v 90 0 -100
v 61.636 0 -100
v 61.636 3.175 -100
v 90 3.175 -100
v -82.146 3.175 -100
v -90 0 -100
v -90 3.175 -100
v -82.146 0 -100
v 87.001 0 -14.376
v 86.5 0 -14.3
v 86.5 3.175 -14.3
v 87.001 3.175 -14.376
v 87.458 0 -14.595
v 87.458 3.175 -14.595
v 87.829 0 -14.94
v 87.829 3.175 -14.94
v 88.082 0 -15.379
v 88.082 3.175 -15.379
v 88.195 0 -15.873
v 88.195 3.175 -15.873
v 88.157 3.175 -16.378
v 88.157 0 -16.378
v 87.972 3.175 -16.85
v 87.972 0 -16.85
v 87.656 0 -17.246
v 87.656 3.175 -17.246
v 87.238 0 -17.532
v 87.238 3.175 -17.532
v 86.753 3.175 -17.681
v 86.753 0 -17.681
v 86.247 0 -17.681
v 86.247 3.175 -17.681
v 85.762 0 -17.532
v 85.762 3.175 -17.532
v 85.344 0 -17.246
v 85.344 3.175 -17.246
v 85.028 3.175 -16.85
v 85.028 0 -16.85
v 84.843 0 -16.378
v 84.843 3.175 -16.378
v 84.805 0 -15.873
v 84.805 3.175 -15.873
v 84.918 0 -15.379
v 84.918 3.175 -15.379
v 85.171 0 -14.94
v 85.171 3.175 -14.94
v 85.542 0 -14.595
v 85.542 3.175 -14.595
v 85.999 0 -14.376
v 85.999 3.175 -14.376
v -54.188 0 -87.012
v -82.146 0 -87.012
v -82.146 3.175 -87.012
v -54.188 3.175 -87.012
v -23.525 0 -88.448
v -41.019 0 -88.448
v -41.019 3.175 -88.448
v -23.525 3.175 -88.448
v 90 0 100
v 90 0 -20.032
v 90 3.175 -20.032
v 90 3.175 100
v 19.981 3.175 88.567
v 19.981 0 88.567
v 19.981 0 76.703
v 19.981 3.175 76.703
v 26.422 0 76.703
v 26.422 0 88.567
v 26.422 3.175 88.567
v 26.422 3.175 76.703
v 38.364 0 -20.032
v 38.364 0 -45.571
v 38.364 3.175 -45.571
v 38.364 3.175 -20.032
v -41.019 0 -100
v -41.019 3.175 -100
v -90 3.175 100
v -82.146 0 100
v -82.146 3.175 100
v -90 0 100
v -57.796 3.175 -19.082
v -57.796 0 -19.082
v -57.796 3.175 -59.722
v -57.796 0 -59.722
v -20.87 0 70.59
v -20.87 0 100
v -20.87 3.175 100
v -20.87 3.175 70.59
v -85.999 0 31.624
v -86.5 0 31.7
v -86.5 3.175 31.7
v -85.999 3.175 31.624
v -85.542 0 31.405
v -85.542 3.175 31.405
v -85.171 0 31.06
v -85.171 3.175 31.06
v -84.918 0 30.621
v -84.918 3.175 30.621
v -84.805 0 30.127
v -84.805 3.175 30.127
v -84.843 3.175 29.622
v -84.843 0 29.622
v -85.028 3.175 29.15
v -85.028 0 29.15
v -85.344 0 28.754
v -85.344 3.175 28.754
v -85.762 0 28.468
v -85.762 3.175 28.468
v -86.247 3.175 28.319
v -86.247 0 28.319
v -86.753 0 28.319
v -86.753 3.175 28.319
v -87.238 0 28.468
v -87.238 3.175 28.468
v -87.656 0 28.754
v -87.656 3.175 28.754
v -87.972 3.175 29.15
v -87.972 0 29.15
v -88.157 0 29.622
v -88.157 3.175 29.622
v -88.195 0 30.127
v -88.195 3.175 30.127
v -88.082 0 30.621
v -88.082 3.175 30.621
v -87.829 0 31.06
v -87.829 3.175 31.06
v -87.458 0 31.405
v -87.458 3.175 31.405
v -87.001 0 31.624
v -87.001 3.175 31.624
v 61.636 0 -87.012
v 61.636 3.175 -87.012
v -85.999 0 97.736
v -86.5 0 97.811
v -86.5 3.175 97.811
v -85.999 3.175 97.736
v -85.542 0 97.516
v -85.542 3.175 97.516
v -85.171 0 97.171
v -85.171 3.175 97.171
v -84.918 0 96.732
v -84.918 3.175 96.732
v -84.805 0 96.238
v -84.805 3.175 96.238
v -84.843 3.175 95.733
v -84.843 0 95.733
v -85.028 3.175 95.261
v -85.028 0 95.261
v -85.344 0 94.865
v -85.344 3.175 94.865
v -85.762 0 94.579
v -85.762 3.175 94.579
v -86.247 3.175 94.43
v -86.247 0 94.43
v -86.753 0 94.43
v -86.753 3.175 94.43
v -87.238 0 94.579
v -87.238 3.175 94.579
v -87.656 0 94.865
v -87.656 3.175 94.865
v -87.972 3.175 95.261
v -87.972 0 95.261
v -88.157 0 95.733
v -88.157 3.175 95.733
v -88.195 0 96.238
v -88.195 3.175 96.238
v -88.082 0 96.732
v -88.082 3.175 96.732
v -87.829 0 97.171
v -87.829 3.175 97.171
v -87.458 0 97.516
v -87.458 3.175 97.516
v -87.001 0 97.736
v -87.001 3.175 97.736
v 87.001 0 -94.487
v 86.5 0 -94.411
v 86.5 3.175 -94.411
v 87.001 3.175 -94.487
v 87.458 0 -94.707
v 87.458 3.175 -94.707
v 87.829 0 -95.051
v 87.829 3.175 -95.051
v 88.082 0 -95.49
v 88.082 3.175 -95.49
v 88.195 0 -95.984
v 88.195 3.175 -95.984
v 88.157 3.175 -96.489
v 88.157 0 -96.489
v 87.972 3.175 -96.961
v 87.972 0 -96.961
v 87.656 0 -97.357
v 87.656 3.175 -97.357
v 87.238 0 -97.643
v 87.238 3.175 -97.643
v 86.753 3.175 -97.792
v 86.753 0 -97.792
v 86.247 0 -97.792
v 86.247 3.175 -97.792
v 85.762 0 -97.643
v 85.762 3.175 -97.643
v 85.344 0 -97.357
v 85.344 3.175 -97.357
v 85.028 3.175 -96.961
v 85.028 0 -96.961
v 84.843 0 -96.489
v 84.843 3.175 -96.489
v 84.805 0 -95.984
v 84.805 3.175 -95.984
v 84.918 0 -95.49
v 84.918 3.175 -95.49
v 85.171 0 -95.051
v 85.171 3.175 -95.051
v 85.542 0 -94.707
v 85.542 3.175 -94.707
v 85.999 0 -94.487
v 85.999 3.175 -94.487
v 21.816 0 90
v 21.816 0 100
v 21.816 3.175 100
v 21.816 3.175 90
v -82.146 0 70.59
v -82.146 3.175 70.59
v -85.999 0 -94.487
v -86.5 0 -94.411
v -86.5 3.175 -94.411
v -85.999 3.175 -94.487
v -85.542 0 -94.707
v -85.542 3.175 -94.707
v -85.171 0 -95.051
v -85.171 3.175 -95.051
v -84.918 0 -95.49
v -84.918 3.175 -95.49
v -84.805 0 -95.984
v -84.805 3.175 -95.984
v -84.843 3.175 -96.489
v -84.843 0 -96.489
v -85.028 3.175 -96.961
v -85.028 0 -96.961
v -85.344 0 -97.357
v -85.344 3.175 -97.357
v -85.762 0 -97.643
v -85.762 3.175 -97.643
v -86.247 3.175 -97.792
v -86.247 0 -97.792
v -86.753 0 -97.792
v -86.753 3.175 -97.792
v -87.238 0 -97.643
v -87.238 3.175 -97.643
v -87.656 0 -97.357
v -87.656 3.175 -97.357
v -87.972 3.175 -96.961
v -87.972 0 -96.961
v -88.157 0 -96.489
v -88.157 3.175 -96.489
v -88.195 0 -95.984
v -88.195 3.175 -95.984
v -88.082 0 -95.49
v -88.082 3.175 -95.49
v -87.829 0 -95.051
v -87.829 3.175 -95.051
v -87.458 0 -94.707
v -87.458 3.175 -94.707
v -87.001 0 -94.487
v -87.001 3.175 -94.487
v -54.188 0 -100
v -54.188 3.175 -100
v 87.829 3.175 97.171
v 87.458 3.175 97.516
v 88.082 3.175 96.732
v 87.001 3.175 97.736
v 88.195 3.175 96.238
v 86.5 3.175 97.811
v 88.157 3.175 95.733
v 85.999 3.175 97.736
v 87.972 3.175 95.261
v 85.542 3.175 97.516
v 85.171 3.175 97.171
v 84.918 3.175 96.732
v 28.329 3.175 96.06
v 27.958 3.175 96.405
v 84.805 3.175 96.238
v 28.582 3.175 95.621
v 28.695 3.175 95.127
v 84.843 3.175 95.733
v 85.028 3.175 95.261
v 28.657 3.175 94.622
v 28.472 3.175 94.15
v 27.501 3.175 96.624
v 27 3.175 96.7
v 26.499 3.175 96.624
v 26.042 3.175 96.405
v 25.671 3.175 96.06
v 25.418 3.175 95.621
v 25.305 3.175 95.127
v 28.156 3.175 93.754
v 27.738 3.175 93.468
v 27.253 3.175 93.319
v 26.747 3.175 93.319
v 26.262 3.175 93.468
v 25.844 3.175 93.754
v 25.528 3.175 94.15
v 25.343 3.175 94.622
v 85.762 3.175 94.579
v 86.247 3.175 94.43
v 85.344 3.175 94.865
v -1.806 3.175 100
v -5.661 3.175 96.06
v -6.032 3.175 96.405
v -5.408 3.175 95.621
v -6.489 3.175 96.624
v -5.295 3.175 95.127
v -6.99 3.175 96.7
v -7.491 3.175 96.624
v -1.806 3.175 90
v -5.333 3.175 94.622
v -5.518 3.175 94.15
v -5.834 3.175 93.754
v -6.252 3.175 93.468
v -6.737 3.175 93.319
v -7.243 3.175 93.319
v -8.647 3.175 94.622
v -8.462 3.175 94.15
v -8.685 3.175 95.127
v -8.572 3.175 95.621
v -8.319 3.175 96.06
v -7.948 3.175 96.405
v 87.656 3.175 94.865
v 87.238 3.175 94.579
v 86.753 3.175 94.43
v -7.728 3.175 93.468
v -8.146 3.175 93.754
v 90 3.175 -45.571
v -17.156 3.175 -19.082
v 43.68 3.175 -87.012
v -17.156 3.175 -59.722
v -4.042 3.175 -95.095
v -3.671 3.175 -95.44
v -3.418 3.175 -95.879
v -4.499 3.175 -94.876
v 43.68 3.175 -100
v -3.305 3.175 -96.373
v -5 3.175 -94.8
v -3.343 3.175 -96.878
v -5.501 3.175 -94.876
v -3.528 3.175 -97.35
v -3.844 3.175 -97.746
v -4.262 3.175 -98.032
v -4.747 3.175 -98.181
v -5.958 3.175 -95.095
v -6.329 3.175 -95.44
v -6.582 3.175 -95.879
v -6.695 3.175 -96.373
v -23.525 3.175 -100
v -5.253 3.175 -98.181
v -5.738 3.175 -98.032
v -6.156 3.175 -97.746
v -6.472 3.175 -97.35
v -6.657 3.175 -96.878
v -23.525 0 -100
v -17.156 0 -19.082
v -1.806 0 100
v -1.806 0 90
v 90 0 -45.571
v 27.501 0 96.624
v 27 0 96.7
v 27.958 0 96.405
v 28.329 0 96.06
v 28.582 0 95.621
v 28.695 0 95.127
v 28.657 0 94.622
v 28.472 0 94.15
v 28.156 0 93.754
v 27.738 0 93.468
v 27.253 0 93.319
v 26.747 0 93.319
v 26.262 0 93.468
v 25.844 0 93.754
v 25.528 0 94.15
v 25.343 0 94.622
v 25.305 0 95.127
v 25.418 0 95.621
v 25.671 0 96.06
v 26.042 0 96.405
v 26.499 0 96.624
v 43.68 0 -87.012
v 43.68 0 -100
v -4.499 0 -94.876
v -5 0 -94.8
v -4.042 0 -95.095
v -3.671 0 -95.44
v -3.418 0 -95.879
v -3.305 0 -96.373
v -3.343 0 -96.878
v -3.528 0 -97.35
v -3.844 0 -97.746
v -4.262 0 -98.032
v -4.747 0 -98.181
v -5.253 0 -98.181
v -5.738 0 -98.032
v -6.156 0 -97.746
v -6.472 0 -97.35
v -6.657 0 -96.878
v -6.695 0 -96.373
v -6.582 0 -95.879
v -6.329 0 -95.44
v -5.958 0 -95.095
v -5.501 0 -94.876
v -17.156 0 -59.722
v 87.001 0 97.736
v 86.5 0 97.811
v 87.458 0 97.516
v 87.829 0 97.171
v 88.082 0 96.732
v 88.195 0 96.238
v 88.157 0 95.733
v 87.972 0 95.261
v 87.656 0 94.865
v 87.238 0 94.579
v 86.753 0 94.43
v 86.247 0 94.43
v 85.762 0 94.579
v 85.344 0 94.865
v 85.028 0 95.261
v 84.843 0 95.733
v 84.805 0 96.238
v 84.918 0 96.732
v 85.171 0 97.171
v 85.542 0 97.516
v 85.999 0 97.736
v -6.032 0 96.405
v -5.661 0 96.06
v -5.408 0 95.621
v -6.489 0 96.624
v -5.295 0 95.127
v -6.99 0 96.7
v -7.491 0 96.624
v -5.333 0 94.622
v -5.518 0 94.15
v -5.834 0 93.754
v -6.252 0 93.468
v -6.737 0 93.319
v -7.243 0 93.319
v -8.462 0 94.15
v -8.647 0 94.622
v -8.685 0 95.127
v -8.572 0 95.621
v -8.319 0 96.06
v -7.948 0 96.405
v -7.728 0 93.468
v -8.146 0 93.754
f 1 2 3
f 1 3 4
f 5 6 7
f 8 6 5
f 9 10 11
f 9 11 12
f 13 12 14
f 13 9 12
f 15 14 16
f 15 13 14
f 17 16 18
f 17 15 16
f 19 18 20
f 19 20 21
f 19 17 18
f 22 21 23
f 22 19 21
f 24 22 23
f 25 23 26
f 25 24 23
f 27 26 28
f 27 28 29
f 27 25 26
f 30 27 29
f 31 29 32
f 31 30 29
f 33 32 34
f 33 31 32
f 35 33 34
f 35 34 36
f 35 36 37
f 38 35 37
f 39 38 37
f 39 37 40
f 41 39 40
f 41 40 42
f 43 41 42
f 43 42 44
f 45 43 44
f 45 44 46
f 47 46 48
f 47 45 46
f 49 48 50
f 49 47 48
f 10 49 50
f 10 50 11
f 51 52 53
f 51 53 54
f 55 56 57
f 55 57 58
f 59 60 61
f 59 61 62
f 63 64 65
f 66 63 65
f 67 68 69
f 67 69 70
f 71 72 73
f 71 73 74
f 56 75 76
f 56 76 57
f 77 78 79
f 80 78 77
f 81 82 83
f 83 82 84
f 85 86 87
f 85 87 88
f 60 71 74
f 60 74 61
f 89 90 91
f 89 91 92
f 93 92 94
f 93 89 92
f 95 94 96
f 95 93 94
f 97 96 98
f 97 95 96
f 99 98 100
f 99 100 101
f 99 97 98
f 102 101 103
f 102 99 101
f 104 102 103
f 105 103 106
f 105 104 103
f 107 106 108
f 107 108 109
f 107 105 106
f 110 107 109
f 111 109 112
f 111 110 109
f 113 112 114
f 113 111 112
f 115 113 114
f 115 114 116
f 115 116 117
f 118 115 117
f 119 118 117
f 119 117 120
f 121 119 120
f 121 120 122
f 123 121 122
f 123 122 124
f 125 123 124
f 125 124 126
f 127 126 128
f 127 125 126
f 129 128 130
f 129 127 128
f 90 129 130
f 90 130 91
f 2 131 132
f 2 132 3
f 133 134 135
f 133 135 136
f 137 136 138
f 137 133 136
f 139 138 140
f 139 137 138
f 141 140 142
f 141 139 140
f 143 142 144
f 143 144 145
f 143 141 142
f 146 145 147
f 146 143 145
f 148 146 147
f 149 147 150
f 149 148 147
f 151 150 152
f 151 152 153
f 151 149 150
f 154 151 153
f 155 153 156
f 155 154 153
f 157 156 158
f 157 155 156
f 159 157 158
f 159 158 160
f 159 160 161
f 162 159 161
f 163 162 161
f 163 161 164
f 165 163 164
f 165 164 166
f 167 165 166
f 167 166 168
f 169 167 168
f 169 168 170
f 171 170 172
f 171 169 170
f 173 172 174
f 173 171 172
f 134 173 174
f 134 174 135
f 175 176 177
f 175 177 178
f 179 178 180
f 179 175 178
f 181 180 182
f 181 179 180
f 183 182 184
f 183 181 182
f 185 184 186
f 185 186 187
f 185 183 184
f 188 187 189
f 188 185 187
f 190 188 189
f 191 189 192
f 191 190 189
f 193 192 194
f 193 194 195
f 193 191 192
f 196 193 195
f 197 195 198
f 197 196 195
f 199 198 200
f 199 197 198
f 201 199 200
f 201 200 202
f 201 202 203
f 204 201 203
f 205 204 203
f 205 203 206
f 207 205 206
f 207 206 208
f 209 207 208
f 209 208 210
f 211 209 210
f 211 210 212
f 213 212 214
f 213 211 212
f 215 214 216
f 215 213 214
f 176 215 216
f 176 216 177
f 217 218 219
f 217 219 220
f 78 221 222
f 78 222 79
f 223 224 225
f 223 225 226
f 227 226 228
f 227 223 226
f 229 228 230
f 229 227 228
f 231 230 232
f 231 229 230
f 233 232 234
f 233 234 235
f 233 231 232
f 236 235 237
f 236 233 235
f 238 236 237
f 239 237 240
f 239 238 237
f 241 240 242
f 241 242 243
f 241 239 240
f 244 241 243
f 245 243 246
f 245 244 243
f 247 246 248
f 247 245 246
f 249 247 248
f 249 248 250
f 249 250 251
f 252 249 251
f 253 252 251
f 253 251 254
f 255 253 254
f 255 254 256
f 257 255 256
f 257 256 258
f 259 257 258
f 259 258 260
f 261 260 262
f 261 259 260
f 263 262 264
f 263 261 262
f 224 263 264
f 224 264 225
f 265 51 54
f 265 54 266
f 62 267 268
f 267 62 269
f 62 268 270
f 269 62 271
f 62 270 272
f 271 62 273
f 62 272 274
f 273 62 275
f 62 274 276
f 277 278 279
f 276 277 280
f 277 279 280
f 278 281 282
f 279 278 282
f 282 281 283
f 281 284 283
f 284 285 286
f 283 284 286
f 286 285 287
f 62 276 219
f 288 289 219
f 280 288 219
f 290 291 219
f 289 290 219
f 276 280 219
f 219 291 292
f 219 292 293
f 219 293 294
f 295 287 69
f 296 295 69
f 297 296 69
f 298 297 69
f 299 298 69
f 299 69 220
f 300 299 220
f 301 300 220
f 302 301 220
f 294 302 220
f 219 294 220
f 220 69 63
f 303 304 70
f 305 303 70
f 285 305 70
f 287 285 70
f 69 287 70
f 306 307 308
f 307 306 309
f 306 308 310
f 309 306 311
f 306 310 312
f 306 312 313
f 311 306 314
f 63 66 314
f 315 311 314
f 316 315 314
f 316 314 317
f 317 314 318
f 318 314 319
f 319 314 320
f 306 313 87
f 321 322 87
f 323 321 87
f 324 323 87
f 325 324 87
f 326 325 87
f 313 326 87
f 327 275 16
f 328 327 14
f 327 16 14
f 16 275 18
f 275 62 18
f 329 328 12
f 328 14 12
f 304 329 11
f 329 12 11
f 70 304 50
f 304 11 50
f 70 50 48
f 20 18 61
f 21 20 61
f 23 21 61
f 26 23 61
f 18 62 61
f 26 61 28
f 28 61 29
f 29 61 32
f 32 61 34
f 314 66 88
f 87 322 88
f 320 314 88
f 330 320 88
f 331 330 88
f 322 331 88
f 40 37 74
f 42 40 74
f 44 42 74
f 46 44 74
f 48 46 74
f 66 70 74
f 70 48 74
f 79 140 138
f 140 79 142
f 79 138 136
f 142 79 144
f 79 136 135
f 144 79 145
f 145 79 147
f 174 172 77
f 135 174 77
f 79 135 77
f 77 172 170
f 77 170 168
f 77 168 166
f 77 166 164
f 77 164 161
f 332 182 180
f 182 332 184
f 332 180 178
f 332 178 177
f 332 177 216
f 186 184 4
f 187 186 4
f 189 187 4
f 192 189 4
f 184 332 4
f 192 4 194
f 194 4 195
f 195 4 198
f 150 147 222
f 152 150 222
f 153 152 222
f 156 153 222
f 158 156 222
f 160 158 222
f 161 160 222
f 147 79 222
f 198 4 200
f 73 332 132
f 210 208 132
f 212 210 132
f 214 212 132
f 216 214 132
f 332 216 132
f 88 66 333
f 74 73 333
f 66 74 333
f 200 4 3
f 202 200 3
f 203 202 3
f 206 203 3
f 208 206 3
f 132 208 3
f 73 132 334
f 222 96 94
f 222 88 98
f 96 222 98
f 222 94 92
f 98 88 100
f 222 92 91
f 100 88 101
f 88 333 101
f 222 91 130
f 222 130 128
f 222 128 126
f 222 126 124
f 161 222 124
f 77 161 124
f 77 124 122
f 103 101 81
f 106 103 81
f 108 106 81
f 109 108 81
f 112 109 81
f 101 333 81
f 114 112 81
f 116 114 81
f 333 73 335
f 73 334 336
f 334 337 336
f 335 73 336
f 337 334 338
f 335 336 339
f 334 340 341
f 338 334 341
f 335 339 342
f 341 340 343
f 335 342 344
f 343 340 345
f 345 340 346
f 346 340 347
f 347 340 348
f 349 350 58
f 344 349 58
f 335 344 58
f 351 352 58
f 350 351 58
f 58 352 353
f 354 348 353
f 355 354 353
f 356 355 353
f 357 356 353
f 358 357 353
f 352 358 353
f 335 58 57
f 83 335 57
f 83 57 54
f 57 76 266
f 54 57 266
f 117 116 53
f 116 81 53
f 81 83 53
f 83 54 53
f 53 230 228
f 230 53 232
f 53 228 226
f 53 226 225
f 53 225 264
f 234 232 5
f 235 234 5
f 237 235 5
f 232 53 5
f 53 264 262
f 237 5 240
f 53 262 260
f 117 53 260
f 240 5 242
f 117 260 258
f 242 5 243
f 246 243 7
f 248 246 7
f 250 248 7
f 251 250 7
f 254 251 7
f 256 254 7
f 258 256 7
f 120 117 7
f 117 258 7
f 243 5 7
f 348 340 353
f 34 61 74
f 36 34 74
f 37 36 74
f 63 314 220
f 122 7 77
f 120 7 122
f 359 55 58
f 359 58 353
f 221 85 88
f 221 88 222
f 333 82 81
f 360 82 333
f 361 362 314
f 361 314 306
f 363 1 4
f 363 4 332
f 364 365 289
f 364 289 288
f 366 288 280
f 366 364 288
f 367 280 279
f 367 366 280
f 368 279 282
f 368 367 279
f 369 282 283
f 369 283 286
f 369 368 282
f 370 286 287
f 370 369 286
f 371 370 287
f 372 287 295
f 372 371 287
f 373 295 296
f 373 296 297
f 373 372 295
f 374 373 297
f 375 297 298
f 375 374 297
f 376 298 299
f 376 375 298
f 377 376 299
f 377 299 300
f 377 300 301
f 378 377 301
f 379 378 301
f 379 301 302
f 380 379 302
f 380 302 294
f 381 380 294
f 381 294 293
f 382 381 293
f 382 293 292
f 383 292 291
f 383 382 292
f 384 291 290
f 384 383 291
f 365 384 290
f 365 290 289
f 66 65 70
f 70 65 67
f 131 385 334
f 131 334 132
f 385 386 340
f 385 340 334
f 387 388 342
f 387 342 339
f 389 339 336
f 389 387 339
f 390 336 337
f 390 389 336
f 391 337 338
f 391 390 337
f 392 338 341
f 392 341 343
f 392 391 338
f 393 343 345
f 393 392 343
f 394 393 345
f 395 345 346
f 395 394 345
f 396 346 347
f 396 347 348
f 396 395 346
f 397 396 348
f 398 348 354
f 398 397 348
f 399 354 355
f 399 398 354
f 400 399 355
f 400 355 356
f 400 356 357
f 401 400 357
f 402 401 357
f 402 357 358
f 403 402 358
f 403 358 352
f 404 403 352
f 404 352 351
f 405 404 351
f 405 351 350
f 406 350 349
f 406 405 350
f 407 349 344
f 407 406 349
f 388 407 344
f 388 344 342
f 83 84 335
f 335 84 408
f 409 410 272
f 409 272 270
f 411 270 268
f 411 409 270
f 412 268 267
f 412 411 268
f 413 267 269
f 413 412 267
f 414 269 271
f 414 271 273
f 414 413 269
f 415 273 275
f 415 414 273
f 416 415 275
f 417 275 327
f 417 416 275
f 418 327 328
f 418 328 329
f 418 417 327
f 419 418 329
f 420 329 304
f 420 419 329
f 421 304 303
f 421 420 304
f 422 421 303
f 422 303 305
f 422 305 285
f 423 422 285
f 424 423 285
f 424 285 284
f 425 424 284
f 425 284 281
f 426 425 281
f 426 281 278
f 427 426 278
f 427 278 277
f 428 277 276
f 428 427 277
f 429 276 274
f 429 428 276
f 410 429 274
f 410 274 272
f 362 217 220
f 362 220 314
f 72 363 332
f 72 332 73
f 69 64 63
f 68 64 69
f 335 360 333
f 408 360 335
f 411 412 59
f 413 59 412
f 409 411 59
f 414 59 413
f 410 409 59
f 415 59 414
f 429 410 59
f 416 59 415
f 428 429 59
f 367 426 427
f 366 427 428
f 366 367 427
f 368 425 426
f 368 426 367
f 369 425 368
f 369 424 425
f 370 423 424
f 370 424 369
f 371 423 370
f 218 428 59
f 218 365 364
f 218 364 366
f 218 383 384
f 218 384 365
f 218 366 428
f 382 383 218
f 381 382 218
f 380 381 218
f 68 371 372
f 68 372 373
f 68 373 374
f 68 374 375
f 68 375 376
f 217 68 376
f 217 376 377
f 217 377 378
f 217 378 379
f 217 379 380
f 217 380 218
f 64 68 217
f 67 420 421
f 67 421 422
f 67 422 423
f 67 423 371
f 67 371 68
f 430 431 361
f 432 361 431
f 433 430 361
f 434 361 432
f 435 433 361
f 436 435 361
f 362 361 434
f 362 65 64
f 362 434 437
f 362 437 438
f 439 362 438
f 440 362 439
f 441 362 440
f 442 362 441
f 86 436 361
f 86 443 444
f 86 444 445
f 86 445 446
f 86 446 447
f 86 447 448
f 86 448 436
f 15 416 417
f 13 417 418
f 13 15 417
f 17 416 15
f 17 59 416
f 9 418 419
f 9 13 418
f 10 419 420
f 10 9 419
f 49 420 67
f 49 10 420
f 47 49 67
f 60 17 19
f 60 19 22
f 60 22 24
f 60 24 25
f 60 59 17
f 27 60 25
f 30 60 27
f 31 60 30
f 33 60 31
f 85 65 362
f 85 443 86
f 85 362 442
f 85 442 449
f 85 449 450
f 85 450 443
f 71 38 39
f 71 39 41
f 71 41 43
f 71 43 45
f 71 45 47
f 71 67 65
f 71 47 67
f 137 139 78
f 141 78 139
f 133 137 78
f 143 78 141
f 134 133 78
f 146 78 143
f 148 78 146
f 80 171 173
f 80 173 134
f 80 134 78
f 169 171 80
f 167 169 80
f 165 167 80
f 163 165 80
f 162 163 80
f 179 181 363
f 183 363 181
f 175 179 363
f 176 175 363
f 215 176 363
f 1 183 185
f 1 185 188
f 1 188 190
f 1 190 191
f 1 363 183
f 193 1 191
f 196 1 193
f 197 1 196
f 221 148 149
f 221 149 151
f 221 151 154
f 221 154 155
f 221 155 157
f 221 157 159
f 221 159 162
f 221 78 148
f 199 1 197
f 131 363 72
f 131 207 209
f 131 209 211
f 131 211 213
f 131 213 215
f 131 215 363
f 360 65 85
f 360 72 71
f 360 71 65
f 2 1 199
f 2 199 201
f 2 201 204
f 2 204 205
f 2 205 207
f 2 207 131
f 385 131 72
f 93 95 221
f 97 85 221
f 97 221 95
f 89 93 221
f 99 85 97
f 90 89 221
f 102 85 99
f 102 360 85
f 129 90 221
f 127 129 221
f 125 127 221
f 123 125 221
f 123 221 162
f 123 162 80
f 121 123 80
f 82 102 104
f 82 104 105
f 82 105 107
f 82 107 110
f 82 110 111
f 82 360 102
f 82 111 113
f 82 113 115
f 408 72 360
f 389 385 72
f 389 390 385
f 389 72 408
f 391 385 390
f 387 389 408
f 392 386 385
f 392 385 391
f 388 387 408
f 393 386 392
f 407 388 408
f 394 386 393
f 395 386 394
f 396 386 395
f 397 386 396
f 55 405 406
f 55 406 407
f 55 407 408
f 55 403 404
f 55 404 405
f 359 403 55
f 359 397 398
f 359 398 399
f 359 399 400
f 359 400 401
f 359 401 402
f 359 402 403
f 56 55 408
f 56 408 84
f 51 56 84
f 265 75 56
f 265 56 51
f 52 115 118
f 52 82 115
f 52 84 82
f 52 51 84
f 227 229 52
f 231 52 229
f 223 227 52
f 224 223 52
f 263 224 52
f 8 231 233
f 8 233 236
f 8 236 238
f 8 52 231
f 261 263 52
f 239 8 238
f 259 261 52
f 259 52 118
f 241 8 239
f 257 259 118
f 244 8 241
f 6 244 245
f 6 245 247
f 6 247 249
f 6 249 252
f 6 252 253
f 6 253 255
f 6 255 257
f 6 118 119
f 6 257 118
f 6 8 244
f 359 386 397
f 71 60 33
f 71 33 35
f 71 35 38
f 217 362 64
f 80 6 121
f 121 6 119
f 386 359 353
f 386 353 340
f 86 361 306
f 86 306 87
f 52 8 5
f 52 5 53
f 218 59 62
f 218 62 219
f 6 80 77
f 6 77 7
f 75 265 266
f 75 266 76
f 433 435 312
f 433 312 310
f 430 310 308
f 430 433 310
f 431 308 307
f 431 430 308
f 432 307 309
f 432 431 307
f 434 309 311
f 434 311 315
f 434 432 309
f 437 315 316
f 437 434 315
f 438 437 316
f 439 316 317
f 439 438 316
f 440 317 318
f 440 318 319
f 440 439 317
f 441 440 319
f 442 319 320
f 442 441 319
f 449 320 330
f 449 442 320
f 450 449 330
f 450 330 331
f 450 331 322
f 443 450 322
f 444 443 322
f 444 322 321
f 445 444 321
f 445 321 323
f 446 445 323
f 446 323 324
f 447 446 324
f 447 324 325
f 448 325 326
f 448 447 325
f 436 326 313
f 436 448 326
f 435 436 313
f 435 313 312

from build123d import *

# Parameters (mm, degrees)
SKETCH1_R           = 1.7
SKETCH1_W           = 40.64
SKETCH1_H           = 40.64
SKETCH1_W_2         = 6.441435375
SKETCH1_H_2         = 11.864636979
BOSS_EXTRUDE1_DEPTH = 3.175


with BuildPart() as part:
    # Sketch1 → Boss-Extrude1 (new body)
    with BuildSketch(Plane(origin=(0, 0, 0), x_dir=(1, 0, 0), z_dir=(0, 1, 0))):
        Polygon((-89.999999959, 100.000000025), (-82.146123441, 100.000000025), (-82.146123441, 87.012397876), (-54.188171851, 87.012397876), (-54.188171851, 100.000000025), (-41.018658576, 100.000000025), (-41.018658576, 88.447791729), (-23.524827511, 88.447791729), (-23.524827511, 100.000000025), (43.67960641, 100.000000025), (43.67960641, 87.012397876), (61.636212859, 87.012397876), (61.636212859, 100.000000025), (89.999999959, 100.000000025), (89.999999959, 45.570881719), (38.364340903, 45.570881719), (38.364340903, 20.032473827), (89.999999959, 20.032473827), (89.999999959, -100.000000025), (21.816000041, -100.000000025), (21.816000041, -90.000000025), (-1.805999959, -90.000000025), (-1.805999959, -100.000000025), (-20.869596106, -100.000000025), (-20.869596106, -70.58952404), (-82.146123441, -70.58952404), (-82.146123441, -100.000000025), (-89.999999959, -100.000000025), align=None)
        with Locations(Location((-86.499999959, 96.111111133, 0), (0, 0, 270))):
            Circle(SKETCH1_R, mode=Mode.SUBTRACT)
        with Locations(Location((-4.999999959, 96.500000025, 0), (0, 0, 270))):
            Circle(SKETCH1_R, mode=Mode.SUBTRACT)
        with Locations(Location((86.500000041, 96.111111224, 0), (0, 0, 270))):
            Circle(SKETCH1_R, mode=Mode.SUBTRACT)
        with Locations(Location((-86.499999959, -96.111111133, 0), (0, 0, 270))):
            Circle(SKETCH1_R, mode=Mode.SUBTRACT)
        with Locations(Location((-6.989999959, -95.000000025, 0), (0, 0, 270))):
            Circle(SKETCH1_R, mode=Mode.SUBTRACT)
        with Locations(Location((27.000000041, -95.000000025, 0), (0, 0, 270))):
            Circle(SKETCH1_R, mode=Mode.SUBTRACT)
        with Locations(Location((86.500000041, -96.111111224, 0), (0, 0, 270))):
            Circle(SKETCH1_R, mode=Mode.SUBTRACT)
        with Locations(Location((86.499999959, 15.999999975, 0), (0, 0, 270))):
            Circle(SKETCH1_R, mode=Mode.SUBTRACT)
        with Locations(Location((-86.499999959, -30.000000025, 0), (0, 0, 270))):
            Circle(SKETCH1_R, mode=Mode.SUBTRACT)
        with Locations((-37.475629524, 39.402171336)):
            Rectangle(SKETCH1_W, SKETCH1_H, mode=Mode.SUBTRACT)
        with Locations((23.20161852, -82.635134039)):
            Rectangle(SKETCH1_W_2, SKETCH1_H_2, mode=Mode.SUBTRACT)
    extrude(amount=BOSS_EXTRUDE1_DEPTH)


solid = part.part
